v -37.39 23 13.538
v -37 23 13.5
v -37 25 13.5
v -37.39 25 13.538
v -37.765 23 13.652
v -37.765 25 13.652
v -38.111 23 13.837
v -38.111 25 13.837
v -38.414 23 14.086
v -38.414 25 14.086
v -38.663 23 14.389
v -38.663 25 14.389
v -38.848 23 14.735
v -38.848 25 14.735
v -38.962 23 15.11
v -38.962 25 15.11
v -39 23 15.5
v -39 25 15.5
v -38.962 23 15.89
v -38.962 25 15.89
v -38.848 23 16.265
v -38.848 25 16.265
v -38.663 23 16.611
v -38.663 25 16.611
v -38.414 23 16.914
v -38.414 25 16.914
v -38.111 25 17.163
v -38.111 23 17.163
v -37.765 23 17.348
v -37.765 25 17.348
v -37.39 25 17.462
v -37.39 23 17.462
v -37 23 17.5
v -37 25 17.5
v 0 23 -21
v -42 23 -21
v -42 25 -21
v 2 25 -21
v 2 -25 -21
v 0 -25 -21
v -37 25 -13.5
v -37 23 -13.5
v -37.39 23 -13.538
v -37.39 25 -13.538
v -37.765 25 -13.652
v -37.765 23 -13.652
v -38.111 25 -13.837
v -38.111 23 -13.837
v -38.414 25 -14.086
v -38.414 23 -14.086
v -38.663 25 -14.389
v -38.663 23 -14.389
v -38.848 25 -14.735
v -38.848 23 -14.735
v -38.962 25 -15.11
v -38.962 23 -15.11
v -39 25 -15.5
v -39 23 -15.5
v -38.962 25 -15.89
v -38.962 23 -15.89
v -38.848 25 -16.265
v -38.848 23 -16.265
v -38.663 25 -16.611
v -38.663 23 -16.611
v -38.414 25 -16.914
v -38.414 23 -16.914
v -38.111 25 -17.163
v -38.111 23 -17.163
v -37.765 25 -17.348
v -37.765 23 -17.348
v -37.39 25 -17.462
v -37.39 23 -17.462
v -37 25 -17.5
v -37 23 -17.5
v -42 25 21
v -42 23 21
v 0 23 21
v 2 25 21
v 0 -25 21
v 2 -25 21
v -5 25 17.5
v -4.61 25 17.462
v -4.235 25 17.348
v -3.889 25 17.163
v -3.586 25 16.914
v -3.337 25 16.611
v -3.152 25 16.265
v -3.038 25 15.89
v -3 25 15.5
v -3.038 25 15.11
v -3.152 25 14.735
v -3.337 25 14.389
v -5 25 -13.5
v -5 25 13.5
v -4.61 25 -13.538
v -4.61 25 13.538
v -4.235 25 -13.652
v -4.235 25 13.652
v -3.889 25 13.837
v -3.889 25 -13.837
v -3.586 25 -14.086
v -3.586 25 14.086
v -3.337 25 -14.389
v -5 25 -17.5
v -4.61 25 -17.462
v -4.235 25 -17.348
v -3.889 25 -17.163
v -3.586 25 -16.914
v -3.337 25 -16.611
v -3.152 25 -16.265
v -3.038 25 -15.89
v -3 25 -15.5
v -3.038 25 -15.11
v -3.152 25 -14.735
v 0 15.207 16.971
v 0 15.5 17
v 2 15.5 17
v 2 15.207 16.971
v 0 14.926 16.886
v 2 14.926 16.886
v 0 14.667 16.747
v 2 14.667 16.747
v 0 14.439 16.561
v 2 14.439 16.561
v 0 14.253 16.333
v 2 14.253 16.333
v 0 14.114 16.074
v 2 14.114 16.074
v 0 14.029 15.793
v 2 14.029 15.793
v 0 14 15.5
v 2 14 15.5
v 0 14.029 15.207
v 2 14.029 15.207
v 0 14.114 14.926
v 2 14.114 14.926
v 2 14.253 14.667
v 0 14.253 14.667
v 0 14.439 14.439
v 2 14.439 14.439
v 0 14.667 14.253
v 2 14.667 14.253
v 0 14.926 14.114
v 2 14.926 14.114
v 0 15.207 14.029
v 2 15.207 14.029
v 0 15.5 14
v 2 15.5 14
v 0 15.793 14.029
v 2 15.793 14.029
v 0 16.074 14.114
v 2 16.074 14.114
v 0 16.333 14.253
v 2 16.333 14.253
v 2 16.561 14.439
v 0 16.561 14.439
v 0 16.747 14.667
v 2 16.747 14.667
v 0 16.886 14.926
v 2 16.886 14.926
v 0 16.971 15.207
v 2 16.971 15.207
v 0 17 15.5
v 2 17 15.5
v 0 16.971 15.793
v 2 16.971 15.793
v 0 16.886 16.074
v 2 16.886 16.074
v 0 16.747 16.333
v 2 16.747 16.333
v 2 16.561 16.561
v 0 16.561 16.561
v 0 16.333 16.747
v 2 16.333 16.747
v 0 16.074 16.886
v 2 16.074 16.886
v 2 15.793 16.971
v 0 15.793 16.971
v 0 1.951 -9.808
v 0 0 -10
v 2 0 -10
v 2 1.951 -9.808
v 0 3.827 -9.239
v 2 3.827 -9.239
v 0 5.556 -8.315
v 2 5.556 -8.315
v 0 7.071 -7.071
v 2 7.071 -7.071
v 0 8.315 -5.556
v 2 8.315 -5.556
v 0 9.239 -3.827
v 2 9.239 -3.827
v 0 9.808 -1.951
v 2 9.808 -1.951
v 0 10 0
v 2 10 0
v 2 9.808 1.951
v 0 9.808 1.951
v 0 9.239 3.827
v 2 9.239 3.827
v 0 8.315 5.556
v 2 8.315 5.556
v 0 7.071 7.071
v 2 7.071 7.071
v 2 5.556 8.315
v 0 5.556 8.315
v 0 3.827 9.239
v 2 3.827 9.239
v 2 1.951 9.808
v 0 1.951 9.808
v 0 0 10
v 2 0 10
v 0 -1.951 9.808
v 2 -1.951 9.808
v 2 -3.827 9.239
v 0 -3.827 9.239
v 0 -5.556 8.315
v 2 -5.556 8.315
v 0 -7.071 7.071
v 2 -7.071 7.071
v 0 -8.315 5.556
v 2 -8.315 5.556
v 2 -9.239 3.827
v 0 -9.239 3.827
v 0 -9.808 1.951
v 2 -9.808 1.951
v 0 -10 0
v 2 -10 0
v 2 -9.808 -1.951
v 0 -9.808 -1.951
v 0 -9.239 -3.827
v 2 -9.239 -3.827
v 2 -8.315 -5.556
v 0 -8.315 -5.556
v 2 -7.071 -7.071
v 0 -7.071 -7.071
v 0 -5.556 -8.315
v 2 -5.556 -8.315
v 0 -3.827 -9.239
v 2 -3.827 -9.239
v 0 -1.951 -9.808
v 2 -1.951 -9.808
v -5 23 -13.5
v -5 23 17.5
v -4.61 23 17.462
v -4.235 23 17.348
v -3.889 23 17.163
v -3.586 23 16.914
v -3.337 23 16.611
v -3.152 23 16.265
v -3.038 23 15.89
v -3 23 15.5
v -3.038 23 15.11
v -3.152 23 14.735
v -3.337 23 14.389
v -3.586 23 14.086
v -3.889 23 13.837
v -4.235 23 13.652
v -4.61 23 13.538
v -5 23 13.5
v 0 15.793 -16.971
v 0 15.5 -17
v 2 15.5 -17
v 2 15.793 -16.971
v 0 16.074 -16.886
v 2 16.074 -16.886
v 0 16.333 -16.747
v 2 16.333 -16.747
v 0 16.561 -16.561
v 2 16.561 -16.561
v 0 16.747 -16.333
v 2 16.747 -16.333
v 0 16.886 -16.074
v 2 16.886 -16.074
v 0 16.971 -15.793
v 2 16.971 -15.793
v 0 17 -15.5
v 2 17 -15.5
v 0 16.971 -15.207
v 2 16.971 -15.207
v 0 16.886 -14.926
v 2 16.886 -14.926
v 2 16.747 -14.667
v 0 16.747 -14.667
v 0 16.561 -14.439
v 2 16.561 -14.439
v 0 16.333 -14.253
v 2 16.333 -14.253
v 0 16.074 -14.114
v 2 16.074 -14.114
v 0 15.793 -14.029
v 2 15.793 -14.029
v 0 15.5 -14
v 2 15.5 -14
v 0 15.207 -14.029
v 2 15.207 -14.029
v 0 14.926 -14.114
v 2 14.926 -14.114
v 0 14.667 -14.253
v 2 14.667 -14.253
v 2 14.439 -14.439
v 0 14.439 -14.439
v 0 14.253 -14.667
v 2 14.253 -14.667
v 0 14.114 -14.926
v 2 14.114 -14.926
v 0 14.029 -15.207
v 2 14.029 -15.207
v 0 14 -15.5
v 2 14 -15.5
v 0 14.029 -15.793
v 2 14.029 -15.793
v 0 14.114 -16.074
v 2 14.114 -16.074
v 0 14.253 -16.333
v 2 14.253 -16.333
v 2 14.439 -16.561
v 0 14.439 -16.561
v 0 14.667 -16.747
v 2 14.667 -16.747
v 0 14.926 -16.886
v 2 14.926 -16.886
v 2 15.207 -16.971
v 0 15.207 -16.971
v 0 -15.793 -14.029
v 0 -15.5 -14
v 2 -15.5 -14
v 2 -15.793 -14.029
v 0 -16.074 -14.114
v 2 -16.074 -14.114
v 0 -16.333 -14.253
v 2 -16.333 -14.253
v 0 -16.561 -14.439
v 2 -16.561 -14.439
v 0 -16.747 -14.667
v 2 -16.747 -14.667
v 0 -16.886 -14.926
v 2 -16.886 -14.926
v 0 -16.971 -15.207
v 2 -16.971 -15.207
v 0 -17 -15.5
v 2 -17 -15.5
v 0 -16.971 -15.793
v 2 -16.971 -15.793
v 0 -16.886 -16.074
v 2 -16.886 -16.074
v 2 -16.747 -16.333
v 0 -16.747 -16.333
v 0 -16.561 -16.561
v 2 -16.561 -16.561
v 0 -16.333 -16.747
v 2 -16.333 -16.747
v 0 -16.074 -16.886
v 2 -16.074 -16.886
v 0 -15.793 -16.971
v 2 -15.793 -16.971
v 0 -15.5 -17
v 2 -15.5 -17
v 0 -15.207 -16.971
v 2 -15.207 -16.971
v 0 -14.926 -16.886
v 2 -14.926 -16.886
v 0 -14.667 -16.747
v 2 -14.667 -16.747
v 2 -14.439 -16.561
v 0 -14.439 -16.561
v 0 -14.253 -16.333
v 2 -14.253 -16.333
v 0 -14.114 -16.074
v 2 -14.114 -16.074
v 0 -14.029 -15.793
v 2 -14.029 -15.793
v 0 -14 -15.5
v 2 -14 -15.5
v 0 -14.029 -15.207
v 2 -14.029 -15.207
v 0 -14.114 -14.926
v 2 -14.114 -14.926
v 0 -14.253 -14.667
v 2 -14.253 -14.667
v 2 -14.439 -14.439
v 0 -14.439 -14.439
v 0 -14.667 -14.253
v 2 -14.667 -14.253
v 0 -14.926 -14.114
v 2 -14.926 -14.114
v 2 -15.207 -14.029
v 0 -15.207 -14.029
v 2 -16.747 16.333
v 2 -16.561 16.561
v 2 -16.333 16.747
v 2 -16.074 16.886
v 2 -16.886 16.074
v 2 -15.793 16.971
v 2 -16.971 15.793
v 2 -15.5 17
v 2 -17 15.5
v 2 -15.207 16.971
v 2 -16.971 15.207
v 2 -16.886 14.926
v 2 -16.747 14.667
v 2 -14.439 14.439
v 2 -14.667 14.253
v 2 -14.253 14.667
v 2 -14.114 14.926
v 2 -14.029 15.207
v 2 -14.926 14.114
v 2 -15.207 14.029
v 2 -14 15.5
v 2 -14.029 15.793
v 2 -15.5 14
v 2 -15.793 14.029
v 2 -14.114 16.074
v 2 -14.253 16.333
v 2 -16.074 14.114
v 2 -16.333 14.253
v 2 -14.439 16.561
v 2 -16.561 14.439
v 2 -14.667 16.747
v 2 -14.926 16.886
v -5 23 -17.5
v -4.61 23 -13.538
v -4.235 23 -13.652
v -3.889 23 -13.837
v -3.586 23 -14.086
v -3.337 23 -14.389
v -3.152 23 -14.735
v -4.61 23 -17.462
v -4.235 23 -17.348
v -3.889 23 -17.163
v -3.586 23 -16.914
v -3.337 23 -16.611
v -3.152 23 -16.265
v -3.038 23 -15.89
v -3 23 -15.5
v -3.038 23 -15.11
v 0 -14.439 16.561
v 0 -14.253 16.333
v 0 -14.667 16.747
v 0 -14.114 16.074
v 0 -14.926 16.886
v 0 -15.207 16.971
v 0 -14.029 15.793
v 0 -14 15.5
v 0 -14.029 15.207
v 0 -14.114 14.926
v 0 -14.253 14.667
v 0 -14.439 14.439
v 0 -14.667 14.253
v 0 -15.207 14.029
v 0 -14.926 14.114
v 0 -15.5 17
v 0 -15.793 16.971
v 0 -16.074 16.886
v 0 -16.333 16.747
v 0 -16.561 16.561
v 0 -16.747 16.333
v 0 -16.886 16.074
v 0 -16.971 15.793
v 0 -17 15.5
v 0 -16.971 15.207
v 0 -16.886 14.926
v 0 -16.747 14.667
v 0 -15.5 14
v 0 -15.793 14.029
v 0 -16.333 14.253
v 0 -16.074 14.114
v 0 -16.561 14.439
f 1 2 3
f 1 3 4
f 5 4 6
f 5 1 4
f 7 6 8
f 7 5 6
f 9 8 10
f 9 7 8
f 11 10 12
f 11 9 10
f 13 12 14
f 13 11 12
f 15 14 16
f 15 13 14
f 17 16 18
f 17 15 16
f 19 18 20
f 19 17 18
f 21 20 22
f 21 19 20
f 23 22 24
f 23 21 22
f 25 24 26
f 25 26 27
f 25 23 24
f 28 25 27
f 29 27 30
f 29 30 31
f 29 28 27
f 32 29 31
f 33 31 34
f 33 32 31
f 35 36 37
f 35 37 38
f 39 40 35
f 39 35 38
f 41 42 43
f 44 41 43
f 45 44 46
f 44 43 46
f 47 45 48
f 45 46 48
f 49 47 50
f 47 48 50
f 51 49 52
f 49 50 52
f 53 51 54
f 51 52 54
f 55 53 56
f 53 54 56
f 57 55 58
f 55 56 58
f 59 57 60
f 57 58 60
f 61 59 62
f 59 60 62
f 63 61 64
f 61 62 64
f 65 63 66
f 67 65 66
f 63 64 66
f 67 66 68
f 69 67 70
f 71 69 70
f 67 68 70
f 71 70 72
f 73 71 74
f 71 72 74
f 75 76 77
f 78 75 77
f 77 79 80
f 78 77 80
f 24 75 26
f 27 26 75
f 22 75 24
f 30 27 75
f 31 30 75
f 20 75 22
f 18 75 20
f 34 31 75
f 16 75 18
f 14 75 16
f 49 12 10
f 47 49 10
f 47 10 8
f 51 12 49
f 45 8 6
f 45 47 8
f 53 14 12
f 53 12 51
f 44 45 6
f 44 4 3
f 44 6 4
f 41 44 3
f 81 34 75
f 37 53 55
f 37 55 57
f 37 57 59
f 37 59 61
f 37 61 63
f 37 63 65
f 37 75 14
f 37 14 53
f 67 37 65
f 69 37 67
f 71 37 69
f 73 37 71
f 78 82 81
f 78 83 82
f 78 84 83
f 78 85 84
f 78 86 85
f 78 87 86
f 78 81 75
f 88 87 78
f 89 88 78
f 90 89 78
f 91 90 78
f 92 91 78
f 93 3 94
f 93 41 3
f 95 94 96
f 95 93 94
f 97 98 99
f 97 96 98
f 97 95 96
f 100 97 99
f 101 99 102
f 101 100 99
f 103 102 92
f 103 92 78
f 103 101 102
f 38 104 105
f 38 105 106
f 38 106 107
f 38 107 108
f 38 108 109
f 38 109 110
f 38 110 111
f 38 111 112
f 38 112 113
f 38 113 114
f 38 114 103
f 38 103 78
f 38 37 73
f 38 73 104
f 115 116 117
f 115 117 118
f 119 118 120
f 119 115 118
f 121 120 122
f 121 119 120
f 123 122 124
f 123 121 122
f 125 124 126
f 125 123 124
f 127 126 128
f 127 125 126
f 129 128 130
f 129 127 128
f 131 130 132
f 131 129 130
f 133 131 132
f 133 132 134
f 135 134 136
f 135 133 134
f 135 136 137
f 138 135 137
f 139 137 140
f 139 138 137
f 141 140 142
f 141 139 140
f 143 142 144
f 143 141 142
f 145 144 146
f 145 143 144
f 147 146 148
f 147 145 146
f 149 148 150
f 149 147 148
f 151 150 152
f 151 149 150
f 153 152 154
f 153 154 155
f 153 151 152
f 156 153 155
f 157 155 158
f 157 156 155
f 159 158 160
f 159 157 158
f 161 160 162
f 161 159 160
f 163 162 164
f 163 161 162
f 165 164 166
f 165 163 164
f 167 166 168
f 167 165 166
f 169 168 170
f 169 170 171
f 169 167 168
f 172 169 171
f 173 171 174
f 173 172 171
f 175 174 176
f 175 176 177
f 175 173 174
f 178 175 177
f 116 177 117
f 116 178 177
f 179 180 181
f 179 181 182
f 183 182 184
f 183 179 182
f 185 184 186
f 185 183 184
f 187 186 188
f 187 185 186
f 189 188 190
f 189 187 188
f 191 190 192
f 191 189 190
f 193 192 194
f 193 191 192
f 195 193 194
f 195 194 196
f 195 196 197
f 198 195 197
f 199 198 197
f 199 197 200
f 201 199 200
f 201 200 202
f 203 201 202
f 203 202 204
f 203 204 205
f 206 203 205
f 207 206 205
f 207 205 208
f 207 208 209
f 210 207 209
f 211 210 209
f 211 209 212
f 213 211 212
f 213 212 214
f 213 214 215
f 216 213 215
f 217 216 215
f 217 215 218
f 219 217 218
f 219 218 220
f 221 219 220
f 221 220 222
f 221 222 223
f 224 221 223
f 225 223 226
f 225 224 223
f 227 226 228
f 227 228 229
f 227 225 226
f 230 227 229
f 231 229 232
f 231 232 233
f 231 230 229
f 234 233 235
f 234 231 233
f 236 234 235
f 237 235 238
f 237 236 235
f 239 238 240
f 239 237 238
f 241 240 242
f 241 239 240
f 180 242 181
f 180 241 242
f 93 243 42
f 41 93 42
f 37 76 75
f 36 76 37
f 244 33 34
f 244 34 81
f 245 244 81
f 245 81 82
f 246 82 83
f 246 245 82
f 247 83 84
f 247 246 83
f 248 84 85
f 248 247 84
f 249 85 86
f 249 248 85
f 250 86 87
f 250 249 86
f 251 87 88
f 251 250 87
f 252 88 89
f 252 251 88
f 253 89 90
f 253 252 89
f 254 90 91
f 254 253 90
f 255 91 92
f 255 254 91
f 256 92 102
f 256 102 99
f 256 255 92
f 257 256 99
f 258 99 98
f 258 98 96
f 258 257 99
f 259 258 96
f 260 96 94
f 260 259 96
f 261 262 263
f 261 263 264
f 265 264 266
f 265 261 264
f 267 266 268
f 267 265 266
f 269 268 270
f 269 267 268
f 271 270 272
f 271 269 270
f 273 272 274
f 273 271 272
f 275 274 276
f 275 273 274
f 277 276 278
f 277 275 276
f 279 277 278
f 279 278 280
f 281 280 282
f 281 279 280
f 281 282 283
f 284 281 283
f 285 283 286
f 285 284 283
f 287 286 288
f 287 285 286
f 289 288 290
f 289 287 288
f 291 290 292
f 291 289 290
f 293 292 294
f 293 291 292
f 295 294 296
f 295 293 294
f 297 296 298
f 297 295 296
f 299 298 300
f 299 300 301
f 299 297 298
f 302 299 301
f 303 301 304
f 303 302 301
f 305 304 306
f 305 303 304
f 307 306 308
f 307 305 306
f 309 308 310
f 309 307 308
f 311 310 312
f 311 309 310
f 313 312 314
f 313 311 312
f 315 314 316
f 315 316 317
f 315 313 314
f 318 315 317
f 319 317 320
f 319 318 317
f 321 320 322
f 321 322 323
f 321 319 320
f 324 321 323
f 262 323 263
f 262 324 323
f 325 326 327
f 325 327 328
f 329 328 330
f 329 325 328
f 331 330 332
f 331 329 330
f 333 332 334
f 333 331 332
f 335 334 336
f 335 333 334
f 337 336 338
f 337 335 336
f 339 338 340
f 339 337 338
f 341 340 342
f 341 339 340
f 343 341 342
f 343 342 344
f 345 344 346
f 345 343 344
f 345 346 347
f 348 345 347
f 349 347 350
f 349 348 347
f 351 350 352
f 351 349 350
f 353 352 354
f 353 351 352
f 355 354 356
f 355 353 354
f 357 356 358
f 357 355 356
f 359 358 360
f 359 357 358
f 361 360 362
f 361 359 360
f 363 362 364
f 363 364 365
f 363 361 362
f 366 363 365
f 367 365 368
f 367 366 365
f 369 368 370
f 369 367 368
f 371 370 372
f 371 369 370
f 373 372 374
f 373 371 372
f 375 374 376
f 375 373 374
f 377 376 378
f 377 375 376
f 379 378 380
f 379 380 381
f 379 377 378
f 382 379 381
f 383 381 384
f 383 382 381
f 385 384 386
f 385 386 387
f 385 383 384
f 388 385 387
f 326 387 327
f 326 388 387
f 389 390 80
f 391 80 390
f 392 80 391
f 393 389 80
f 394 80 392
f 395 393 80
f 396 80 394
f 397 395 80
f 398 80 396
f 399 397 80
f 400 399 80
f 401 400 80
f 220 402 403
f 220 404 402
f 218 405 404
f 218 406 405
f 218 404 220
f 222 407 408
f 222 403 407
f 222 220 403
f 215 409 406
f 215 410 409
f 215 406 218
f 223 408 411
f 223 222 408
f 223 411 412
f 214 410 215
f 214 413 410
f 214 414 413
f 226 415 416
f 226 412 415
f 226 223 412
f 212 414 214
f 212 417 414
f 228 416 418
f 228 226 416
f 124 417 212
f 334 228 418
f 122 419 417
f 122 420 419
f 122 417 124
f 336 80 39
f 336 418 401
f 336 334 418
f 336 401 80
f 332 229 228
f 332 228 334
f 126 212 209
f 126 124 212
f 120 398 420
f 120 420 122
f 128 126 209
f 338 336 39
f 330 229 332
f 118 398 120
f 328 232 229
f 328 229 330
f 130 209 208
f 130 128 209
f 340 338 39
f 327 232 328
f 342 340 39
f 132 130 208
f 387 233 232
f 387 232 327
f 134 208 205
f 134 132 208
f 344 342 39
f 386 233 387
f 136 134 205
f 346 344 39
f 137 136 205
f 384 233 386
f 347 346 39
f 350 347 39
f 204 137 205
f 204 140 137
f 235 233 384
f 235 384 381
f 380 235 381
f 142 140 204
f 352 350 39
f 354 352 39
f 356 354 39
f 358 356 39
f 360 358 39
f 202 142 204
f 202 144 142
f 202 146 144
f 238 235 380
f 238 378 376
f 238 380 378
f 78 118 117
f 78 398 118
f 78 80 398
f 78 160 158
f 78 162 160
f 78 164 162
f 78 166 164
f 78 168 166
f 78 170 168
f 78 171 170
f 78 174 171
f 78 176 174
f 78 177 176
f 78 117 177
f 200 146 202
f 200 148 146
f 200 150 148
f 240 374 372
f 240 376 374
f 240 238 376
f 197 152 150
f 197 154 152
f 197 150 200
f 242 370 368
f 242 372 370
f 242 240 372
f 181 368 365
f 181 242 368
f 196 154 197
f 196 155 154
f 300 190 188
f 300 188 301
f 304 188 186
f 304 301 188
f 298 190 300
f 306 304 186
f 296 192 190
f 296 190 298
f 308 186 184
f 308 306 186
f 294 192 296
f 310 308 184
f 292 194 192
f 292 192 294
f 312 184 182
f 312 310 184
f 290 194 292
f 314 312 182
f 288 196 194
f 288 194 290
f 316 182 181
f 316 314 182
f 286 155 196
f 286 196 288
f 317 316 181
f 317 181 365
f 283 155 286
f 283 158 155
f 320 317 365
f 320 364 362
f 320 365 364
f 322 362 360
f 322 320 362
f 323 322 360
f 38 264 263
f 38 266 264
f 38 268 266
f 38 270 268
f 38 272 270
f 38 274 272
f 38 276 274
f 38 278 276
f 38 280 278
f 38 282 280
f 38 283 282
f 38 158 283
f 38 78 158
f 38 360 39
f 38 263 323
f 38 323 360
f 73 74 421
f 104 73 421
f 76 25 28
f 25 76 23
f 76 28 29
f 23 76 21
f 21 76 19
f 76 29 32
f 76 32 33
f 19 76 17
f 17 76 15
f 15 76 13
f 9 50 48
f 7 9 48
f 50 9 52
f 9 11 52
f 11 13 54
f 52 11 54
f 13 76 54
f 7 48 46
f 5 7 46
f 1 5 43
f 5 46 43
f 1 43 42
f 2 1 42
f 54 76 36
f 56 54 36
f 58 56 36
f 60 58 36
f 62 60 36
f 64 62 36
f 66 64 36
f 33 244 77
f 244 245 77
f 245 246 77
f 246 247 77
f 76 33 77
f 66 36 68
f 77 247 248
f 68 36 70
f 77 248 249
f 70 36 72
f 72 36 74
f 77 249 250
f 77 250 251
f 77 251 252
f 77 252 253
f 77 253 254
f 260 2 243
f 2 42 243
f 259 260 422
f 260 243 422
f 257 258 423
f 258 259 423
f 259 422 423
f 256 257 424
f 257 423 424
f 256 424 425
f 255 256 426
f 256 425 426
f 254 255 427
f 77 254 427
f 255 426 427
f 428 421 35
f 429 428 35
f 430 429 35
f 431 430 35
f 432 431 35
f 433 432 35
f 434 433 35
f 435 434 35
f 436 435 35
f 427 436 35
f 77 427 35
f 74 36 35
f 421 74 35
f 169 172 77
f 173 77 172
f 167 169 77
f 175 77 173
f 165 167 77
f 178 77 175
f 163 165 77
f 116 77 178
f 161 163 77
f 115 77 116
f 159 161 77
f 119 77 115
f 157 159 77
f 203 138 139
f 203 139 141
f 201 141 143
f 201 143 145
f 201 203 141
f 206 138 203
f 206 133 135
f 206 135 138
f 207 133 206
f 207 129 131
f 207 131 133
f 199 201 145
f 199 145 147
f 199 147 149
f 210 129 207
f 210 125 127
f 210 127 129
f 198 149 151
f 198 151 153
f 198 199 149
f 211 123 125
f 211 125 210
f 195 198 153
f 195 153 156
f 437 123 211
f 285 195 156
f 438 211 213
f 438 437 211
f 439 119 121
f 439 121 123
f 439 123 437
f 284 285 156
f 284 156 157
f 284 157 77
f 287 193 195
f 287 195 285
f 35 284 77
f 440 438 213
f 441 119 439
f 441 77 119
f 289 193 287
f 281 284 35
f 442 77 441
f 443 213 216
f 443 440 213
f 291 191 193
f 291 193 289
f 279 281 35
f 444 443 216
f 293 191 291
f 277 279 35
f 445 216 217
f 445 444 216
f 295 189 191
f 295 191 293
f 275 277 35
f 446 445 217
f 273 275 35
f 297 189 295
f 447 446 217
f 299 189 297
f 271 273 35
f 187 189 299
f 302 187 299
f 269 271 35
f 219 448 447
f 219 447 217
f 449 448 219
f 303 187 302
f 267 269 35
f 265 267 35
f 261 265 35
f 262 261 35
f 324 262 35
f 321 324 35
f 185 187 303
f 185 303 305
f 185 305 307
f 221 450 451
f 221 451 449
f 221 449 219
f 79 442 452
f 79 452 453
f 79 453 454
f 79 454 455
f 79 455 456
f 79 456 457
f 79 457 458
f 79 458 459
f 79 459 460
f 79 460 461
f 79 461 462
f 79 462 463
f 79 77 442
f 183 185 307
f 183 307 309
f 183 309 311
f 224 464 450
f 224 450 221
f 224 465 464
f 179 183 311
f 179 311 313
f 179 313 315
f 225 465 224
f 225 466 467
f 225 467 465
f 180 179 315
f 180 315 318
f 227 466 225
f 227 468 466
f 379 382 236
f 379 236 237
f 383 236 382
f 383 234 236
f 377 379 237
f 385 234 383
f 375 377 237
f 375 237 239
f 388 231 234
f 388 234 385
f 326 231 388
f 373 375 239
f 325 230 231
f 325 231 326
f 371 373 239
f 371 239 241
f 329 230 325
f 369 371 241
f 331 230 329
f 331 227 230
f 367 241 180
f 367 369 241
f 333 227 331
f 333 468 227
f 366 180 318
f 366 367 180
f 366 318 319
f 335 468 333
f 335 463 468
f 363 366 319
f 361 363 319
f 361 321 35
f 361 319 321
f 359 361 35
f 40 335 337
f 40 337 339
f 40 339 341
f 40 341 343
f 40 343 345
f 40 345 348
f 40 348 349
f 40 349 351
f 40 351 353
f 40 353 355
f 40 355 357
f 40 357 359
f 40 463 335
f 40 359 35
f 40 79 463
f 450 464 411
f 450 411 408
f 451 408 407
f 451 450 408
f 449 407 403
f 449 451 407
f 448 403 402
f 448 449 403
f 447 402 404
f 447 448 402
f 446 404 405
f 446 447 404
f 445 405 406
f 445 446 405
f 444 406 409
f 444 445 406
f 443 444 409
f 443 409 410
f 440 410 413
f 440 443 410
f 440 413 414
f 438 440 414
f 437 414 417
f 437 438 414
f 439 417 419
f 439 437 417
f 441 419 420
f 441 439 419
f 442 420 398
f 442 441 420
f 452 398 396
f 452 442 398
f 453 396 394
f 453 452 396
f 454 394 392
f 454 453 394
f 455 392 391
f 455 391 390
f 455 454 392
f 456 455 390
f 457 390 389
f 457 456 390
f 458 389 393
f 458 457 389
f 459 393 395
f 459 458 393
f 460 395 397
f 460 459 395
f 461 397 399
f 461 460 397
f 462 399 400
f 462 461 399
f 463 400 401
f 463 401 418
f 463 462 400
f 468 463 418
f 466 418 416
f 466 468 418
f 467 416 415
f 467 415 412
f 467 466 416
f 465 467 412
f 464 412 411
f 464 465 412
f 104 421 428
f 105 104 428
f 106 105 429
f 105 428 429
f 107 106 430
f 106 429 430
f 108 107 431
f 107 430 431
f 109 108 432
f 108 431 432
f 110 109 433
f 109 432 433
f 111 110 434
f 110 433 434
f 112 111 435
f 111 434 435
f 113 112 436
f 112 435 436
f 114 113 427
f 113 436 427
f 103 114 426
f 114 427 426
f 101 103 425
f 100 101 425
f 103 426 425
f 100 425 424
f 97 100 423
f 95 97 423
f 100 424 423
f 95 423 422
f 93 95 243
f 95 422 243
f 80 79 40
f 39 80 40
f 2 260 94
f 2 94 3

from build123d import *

# Parameters (mm, degrees)
SKETCH_2_W          = 42
SKETCH_2_H          = 50
SKETCH_2_R          = 1.5
SKETCH_2_R_2        = 10
EXTRUDE_5_DEPTH     = 2
SKETCH_4_W          = 42
SKETCH_4_H          = 42
EXTRUDE_6_DEPTH     = 25
SKETCH_4_3_W        = 42
SKETCH_4_3_H        = 42
CUT_EXTRUDE_1_DEPTH = 23


with BuildPart() as part:
    # 草图2 → 凸台-拉伸5 (new body)
    with BuildSketch(Plane(origin=(0, 0, 0), x_dir=(0, 0, -1), z_dir=(1, 0, 0))):
        Rectangle(SKETCH_2_W, SKETCH_2_H)
        with Locations((15.5, 15.5)):
            Circle(SKETCH_2_R, mode=Mode.SUBTRACT)
        with Locations((15.5, -15.5)):
            Circle(SKETCH_2_R, mode=Mode.SUBTRACT)
        with Locations((-15.5, -15.5)):
            Circle(SKETCH_2_R, mode=Mode.SUBTRACT)
        with Locations((-15.5, 15.5)):
            Circle(SKETCH_2_R, mode=Mode.SUBTRACT)
        Circle(SKETCH_2_R_2, mode=Mode.SUBTRACT)
    extrude(amount=EXTRUDE_5_DEPTH)

    # 草图4 → 凸台-拉伸6 (add)
    with BuildSketch(Plane(origin=(0, 0, 0), x_dir=(1, 0, 0), z_dir=(0, 1, 0))):
        with Locations((-21, 0)):
            Rectangle(SKETCH_4_W, SKETCH_4_H)
        with BuildLine():
            Line((-37, 17.5), (-5, 17.5))
            ThreePointArc((-5, 17.5), (-3, 15.5), (-5, 13.5))
            Line((-5, 13.5), (-37, 13.5))
            ThreePointArc((-37, 13.5), (-39, 15.5), (-37, 17.5))
        make_face(mode=Mode.SUBTRACT)
        with BuildLine():
            Line((-37, -17.5), (-5, -17.5))
            ThreePointArc((-5, -17.5), (-3, -15.5), (-5, -13.5))
            Line((-5, -13.5), (-37, -13.5))
            ThreePointArc((-37, -13.5), (-39, -15.5), (-37, -17.5))
        make_face(mode=Mode.SUBTRACT)
    extrude(amount=EXTRUDE_6_DEPTH)

    # 草图4<3> → 切除-拉伸1 (cut)
    with BuildSketch(Plane(origin=(0, 0, 0), x_dir=(1, 0, 0), z_dir=(0, 1, 0))):
        with Locations((-21, 0)):
            Rectangle(SKETCH_4_3_W, SKETCH_4_3_H)
        with BuildLine():
            Line((-37, 17.5), (-5, 17.5))
            ThreePointArc((-5, 17.5), (-3, 15.5), (-5, 13.5))
            Line((-5, 13.5), (-37, 13.5))
            ThreePointArc((-37, 13.5), (-39, 15.5), (-37, 17.5))
        make_face(mode=Mode.SUBTRACT)
        with BuildLine():
            Line((-37, -17.5), (-5, -17.5))
            ThreePointArc((-5, -17.5), (-3, -15.5), (-5, -13.5))
            Line((-5, -13.5), (-37, -13.5))
            ThreePointArc((-37, -13.5), (-39, -15.5), (-37, -17.5))
        make_face(mode=Mode.SUBTRACT)
    extrude(amount=CUT_EXTRUDE_1_DEPTH, mode=Mode.SUBTRACT)


solid = part.part
